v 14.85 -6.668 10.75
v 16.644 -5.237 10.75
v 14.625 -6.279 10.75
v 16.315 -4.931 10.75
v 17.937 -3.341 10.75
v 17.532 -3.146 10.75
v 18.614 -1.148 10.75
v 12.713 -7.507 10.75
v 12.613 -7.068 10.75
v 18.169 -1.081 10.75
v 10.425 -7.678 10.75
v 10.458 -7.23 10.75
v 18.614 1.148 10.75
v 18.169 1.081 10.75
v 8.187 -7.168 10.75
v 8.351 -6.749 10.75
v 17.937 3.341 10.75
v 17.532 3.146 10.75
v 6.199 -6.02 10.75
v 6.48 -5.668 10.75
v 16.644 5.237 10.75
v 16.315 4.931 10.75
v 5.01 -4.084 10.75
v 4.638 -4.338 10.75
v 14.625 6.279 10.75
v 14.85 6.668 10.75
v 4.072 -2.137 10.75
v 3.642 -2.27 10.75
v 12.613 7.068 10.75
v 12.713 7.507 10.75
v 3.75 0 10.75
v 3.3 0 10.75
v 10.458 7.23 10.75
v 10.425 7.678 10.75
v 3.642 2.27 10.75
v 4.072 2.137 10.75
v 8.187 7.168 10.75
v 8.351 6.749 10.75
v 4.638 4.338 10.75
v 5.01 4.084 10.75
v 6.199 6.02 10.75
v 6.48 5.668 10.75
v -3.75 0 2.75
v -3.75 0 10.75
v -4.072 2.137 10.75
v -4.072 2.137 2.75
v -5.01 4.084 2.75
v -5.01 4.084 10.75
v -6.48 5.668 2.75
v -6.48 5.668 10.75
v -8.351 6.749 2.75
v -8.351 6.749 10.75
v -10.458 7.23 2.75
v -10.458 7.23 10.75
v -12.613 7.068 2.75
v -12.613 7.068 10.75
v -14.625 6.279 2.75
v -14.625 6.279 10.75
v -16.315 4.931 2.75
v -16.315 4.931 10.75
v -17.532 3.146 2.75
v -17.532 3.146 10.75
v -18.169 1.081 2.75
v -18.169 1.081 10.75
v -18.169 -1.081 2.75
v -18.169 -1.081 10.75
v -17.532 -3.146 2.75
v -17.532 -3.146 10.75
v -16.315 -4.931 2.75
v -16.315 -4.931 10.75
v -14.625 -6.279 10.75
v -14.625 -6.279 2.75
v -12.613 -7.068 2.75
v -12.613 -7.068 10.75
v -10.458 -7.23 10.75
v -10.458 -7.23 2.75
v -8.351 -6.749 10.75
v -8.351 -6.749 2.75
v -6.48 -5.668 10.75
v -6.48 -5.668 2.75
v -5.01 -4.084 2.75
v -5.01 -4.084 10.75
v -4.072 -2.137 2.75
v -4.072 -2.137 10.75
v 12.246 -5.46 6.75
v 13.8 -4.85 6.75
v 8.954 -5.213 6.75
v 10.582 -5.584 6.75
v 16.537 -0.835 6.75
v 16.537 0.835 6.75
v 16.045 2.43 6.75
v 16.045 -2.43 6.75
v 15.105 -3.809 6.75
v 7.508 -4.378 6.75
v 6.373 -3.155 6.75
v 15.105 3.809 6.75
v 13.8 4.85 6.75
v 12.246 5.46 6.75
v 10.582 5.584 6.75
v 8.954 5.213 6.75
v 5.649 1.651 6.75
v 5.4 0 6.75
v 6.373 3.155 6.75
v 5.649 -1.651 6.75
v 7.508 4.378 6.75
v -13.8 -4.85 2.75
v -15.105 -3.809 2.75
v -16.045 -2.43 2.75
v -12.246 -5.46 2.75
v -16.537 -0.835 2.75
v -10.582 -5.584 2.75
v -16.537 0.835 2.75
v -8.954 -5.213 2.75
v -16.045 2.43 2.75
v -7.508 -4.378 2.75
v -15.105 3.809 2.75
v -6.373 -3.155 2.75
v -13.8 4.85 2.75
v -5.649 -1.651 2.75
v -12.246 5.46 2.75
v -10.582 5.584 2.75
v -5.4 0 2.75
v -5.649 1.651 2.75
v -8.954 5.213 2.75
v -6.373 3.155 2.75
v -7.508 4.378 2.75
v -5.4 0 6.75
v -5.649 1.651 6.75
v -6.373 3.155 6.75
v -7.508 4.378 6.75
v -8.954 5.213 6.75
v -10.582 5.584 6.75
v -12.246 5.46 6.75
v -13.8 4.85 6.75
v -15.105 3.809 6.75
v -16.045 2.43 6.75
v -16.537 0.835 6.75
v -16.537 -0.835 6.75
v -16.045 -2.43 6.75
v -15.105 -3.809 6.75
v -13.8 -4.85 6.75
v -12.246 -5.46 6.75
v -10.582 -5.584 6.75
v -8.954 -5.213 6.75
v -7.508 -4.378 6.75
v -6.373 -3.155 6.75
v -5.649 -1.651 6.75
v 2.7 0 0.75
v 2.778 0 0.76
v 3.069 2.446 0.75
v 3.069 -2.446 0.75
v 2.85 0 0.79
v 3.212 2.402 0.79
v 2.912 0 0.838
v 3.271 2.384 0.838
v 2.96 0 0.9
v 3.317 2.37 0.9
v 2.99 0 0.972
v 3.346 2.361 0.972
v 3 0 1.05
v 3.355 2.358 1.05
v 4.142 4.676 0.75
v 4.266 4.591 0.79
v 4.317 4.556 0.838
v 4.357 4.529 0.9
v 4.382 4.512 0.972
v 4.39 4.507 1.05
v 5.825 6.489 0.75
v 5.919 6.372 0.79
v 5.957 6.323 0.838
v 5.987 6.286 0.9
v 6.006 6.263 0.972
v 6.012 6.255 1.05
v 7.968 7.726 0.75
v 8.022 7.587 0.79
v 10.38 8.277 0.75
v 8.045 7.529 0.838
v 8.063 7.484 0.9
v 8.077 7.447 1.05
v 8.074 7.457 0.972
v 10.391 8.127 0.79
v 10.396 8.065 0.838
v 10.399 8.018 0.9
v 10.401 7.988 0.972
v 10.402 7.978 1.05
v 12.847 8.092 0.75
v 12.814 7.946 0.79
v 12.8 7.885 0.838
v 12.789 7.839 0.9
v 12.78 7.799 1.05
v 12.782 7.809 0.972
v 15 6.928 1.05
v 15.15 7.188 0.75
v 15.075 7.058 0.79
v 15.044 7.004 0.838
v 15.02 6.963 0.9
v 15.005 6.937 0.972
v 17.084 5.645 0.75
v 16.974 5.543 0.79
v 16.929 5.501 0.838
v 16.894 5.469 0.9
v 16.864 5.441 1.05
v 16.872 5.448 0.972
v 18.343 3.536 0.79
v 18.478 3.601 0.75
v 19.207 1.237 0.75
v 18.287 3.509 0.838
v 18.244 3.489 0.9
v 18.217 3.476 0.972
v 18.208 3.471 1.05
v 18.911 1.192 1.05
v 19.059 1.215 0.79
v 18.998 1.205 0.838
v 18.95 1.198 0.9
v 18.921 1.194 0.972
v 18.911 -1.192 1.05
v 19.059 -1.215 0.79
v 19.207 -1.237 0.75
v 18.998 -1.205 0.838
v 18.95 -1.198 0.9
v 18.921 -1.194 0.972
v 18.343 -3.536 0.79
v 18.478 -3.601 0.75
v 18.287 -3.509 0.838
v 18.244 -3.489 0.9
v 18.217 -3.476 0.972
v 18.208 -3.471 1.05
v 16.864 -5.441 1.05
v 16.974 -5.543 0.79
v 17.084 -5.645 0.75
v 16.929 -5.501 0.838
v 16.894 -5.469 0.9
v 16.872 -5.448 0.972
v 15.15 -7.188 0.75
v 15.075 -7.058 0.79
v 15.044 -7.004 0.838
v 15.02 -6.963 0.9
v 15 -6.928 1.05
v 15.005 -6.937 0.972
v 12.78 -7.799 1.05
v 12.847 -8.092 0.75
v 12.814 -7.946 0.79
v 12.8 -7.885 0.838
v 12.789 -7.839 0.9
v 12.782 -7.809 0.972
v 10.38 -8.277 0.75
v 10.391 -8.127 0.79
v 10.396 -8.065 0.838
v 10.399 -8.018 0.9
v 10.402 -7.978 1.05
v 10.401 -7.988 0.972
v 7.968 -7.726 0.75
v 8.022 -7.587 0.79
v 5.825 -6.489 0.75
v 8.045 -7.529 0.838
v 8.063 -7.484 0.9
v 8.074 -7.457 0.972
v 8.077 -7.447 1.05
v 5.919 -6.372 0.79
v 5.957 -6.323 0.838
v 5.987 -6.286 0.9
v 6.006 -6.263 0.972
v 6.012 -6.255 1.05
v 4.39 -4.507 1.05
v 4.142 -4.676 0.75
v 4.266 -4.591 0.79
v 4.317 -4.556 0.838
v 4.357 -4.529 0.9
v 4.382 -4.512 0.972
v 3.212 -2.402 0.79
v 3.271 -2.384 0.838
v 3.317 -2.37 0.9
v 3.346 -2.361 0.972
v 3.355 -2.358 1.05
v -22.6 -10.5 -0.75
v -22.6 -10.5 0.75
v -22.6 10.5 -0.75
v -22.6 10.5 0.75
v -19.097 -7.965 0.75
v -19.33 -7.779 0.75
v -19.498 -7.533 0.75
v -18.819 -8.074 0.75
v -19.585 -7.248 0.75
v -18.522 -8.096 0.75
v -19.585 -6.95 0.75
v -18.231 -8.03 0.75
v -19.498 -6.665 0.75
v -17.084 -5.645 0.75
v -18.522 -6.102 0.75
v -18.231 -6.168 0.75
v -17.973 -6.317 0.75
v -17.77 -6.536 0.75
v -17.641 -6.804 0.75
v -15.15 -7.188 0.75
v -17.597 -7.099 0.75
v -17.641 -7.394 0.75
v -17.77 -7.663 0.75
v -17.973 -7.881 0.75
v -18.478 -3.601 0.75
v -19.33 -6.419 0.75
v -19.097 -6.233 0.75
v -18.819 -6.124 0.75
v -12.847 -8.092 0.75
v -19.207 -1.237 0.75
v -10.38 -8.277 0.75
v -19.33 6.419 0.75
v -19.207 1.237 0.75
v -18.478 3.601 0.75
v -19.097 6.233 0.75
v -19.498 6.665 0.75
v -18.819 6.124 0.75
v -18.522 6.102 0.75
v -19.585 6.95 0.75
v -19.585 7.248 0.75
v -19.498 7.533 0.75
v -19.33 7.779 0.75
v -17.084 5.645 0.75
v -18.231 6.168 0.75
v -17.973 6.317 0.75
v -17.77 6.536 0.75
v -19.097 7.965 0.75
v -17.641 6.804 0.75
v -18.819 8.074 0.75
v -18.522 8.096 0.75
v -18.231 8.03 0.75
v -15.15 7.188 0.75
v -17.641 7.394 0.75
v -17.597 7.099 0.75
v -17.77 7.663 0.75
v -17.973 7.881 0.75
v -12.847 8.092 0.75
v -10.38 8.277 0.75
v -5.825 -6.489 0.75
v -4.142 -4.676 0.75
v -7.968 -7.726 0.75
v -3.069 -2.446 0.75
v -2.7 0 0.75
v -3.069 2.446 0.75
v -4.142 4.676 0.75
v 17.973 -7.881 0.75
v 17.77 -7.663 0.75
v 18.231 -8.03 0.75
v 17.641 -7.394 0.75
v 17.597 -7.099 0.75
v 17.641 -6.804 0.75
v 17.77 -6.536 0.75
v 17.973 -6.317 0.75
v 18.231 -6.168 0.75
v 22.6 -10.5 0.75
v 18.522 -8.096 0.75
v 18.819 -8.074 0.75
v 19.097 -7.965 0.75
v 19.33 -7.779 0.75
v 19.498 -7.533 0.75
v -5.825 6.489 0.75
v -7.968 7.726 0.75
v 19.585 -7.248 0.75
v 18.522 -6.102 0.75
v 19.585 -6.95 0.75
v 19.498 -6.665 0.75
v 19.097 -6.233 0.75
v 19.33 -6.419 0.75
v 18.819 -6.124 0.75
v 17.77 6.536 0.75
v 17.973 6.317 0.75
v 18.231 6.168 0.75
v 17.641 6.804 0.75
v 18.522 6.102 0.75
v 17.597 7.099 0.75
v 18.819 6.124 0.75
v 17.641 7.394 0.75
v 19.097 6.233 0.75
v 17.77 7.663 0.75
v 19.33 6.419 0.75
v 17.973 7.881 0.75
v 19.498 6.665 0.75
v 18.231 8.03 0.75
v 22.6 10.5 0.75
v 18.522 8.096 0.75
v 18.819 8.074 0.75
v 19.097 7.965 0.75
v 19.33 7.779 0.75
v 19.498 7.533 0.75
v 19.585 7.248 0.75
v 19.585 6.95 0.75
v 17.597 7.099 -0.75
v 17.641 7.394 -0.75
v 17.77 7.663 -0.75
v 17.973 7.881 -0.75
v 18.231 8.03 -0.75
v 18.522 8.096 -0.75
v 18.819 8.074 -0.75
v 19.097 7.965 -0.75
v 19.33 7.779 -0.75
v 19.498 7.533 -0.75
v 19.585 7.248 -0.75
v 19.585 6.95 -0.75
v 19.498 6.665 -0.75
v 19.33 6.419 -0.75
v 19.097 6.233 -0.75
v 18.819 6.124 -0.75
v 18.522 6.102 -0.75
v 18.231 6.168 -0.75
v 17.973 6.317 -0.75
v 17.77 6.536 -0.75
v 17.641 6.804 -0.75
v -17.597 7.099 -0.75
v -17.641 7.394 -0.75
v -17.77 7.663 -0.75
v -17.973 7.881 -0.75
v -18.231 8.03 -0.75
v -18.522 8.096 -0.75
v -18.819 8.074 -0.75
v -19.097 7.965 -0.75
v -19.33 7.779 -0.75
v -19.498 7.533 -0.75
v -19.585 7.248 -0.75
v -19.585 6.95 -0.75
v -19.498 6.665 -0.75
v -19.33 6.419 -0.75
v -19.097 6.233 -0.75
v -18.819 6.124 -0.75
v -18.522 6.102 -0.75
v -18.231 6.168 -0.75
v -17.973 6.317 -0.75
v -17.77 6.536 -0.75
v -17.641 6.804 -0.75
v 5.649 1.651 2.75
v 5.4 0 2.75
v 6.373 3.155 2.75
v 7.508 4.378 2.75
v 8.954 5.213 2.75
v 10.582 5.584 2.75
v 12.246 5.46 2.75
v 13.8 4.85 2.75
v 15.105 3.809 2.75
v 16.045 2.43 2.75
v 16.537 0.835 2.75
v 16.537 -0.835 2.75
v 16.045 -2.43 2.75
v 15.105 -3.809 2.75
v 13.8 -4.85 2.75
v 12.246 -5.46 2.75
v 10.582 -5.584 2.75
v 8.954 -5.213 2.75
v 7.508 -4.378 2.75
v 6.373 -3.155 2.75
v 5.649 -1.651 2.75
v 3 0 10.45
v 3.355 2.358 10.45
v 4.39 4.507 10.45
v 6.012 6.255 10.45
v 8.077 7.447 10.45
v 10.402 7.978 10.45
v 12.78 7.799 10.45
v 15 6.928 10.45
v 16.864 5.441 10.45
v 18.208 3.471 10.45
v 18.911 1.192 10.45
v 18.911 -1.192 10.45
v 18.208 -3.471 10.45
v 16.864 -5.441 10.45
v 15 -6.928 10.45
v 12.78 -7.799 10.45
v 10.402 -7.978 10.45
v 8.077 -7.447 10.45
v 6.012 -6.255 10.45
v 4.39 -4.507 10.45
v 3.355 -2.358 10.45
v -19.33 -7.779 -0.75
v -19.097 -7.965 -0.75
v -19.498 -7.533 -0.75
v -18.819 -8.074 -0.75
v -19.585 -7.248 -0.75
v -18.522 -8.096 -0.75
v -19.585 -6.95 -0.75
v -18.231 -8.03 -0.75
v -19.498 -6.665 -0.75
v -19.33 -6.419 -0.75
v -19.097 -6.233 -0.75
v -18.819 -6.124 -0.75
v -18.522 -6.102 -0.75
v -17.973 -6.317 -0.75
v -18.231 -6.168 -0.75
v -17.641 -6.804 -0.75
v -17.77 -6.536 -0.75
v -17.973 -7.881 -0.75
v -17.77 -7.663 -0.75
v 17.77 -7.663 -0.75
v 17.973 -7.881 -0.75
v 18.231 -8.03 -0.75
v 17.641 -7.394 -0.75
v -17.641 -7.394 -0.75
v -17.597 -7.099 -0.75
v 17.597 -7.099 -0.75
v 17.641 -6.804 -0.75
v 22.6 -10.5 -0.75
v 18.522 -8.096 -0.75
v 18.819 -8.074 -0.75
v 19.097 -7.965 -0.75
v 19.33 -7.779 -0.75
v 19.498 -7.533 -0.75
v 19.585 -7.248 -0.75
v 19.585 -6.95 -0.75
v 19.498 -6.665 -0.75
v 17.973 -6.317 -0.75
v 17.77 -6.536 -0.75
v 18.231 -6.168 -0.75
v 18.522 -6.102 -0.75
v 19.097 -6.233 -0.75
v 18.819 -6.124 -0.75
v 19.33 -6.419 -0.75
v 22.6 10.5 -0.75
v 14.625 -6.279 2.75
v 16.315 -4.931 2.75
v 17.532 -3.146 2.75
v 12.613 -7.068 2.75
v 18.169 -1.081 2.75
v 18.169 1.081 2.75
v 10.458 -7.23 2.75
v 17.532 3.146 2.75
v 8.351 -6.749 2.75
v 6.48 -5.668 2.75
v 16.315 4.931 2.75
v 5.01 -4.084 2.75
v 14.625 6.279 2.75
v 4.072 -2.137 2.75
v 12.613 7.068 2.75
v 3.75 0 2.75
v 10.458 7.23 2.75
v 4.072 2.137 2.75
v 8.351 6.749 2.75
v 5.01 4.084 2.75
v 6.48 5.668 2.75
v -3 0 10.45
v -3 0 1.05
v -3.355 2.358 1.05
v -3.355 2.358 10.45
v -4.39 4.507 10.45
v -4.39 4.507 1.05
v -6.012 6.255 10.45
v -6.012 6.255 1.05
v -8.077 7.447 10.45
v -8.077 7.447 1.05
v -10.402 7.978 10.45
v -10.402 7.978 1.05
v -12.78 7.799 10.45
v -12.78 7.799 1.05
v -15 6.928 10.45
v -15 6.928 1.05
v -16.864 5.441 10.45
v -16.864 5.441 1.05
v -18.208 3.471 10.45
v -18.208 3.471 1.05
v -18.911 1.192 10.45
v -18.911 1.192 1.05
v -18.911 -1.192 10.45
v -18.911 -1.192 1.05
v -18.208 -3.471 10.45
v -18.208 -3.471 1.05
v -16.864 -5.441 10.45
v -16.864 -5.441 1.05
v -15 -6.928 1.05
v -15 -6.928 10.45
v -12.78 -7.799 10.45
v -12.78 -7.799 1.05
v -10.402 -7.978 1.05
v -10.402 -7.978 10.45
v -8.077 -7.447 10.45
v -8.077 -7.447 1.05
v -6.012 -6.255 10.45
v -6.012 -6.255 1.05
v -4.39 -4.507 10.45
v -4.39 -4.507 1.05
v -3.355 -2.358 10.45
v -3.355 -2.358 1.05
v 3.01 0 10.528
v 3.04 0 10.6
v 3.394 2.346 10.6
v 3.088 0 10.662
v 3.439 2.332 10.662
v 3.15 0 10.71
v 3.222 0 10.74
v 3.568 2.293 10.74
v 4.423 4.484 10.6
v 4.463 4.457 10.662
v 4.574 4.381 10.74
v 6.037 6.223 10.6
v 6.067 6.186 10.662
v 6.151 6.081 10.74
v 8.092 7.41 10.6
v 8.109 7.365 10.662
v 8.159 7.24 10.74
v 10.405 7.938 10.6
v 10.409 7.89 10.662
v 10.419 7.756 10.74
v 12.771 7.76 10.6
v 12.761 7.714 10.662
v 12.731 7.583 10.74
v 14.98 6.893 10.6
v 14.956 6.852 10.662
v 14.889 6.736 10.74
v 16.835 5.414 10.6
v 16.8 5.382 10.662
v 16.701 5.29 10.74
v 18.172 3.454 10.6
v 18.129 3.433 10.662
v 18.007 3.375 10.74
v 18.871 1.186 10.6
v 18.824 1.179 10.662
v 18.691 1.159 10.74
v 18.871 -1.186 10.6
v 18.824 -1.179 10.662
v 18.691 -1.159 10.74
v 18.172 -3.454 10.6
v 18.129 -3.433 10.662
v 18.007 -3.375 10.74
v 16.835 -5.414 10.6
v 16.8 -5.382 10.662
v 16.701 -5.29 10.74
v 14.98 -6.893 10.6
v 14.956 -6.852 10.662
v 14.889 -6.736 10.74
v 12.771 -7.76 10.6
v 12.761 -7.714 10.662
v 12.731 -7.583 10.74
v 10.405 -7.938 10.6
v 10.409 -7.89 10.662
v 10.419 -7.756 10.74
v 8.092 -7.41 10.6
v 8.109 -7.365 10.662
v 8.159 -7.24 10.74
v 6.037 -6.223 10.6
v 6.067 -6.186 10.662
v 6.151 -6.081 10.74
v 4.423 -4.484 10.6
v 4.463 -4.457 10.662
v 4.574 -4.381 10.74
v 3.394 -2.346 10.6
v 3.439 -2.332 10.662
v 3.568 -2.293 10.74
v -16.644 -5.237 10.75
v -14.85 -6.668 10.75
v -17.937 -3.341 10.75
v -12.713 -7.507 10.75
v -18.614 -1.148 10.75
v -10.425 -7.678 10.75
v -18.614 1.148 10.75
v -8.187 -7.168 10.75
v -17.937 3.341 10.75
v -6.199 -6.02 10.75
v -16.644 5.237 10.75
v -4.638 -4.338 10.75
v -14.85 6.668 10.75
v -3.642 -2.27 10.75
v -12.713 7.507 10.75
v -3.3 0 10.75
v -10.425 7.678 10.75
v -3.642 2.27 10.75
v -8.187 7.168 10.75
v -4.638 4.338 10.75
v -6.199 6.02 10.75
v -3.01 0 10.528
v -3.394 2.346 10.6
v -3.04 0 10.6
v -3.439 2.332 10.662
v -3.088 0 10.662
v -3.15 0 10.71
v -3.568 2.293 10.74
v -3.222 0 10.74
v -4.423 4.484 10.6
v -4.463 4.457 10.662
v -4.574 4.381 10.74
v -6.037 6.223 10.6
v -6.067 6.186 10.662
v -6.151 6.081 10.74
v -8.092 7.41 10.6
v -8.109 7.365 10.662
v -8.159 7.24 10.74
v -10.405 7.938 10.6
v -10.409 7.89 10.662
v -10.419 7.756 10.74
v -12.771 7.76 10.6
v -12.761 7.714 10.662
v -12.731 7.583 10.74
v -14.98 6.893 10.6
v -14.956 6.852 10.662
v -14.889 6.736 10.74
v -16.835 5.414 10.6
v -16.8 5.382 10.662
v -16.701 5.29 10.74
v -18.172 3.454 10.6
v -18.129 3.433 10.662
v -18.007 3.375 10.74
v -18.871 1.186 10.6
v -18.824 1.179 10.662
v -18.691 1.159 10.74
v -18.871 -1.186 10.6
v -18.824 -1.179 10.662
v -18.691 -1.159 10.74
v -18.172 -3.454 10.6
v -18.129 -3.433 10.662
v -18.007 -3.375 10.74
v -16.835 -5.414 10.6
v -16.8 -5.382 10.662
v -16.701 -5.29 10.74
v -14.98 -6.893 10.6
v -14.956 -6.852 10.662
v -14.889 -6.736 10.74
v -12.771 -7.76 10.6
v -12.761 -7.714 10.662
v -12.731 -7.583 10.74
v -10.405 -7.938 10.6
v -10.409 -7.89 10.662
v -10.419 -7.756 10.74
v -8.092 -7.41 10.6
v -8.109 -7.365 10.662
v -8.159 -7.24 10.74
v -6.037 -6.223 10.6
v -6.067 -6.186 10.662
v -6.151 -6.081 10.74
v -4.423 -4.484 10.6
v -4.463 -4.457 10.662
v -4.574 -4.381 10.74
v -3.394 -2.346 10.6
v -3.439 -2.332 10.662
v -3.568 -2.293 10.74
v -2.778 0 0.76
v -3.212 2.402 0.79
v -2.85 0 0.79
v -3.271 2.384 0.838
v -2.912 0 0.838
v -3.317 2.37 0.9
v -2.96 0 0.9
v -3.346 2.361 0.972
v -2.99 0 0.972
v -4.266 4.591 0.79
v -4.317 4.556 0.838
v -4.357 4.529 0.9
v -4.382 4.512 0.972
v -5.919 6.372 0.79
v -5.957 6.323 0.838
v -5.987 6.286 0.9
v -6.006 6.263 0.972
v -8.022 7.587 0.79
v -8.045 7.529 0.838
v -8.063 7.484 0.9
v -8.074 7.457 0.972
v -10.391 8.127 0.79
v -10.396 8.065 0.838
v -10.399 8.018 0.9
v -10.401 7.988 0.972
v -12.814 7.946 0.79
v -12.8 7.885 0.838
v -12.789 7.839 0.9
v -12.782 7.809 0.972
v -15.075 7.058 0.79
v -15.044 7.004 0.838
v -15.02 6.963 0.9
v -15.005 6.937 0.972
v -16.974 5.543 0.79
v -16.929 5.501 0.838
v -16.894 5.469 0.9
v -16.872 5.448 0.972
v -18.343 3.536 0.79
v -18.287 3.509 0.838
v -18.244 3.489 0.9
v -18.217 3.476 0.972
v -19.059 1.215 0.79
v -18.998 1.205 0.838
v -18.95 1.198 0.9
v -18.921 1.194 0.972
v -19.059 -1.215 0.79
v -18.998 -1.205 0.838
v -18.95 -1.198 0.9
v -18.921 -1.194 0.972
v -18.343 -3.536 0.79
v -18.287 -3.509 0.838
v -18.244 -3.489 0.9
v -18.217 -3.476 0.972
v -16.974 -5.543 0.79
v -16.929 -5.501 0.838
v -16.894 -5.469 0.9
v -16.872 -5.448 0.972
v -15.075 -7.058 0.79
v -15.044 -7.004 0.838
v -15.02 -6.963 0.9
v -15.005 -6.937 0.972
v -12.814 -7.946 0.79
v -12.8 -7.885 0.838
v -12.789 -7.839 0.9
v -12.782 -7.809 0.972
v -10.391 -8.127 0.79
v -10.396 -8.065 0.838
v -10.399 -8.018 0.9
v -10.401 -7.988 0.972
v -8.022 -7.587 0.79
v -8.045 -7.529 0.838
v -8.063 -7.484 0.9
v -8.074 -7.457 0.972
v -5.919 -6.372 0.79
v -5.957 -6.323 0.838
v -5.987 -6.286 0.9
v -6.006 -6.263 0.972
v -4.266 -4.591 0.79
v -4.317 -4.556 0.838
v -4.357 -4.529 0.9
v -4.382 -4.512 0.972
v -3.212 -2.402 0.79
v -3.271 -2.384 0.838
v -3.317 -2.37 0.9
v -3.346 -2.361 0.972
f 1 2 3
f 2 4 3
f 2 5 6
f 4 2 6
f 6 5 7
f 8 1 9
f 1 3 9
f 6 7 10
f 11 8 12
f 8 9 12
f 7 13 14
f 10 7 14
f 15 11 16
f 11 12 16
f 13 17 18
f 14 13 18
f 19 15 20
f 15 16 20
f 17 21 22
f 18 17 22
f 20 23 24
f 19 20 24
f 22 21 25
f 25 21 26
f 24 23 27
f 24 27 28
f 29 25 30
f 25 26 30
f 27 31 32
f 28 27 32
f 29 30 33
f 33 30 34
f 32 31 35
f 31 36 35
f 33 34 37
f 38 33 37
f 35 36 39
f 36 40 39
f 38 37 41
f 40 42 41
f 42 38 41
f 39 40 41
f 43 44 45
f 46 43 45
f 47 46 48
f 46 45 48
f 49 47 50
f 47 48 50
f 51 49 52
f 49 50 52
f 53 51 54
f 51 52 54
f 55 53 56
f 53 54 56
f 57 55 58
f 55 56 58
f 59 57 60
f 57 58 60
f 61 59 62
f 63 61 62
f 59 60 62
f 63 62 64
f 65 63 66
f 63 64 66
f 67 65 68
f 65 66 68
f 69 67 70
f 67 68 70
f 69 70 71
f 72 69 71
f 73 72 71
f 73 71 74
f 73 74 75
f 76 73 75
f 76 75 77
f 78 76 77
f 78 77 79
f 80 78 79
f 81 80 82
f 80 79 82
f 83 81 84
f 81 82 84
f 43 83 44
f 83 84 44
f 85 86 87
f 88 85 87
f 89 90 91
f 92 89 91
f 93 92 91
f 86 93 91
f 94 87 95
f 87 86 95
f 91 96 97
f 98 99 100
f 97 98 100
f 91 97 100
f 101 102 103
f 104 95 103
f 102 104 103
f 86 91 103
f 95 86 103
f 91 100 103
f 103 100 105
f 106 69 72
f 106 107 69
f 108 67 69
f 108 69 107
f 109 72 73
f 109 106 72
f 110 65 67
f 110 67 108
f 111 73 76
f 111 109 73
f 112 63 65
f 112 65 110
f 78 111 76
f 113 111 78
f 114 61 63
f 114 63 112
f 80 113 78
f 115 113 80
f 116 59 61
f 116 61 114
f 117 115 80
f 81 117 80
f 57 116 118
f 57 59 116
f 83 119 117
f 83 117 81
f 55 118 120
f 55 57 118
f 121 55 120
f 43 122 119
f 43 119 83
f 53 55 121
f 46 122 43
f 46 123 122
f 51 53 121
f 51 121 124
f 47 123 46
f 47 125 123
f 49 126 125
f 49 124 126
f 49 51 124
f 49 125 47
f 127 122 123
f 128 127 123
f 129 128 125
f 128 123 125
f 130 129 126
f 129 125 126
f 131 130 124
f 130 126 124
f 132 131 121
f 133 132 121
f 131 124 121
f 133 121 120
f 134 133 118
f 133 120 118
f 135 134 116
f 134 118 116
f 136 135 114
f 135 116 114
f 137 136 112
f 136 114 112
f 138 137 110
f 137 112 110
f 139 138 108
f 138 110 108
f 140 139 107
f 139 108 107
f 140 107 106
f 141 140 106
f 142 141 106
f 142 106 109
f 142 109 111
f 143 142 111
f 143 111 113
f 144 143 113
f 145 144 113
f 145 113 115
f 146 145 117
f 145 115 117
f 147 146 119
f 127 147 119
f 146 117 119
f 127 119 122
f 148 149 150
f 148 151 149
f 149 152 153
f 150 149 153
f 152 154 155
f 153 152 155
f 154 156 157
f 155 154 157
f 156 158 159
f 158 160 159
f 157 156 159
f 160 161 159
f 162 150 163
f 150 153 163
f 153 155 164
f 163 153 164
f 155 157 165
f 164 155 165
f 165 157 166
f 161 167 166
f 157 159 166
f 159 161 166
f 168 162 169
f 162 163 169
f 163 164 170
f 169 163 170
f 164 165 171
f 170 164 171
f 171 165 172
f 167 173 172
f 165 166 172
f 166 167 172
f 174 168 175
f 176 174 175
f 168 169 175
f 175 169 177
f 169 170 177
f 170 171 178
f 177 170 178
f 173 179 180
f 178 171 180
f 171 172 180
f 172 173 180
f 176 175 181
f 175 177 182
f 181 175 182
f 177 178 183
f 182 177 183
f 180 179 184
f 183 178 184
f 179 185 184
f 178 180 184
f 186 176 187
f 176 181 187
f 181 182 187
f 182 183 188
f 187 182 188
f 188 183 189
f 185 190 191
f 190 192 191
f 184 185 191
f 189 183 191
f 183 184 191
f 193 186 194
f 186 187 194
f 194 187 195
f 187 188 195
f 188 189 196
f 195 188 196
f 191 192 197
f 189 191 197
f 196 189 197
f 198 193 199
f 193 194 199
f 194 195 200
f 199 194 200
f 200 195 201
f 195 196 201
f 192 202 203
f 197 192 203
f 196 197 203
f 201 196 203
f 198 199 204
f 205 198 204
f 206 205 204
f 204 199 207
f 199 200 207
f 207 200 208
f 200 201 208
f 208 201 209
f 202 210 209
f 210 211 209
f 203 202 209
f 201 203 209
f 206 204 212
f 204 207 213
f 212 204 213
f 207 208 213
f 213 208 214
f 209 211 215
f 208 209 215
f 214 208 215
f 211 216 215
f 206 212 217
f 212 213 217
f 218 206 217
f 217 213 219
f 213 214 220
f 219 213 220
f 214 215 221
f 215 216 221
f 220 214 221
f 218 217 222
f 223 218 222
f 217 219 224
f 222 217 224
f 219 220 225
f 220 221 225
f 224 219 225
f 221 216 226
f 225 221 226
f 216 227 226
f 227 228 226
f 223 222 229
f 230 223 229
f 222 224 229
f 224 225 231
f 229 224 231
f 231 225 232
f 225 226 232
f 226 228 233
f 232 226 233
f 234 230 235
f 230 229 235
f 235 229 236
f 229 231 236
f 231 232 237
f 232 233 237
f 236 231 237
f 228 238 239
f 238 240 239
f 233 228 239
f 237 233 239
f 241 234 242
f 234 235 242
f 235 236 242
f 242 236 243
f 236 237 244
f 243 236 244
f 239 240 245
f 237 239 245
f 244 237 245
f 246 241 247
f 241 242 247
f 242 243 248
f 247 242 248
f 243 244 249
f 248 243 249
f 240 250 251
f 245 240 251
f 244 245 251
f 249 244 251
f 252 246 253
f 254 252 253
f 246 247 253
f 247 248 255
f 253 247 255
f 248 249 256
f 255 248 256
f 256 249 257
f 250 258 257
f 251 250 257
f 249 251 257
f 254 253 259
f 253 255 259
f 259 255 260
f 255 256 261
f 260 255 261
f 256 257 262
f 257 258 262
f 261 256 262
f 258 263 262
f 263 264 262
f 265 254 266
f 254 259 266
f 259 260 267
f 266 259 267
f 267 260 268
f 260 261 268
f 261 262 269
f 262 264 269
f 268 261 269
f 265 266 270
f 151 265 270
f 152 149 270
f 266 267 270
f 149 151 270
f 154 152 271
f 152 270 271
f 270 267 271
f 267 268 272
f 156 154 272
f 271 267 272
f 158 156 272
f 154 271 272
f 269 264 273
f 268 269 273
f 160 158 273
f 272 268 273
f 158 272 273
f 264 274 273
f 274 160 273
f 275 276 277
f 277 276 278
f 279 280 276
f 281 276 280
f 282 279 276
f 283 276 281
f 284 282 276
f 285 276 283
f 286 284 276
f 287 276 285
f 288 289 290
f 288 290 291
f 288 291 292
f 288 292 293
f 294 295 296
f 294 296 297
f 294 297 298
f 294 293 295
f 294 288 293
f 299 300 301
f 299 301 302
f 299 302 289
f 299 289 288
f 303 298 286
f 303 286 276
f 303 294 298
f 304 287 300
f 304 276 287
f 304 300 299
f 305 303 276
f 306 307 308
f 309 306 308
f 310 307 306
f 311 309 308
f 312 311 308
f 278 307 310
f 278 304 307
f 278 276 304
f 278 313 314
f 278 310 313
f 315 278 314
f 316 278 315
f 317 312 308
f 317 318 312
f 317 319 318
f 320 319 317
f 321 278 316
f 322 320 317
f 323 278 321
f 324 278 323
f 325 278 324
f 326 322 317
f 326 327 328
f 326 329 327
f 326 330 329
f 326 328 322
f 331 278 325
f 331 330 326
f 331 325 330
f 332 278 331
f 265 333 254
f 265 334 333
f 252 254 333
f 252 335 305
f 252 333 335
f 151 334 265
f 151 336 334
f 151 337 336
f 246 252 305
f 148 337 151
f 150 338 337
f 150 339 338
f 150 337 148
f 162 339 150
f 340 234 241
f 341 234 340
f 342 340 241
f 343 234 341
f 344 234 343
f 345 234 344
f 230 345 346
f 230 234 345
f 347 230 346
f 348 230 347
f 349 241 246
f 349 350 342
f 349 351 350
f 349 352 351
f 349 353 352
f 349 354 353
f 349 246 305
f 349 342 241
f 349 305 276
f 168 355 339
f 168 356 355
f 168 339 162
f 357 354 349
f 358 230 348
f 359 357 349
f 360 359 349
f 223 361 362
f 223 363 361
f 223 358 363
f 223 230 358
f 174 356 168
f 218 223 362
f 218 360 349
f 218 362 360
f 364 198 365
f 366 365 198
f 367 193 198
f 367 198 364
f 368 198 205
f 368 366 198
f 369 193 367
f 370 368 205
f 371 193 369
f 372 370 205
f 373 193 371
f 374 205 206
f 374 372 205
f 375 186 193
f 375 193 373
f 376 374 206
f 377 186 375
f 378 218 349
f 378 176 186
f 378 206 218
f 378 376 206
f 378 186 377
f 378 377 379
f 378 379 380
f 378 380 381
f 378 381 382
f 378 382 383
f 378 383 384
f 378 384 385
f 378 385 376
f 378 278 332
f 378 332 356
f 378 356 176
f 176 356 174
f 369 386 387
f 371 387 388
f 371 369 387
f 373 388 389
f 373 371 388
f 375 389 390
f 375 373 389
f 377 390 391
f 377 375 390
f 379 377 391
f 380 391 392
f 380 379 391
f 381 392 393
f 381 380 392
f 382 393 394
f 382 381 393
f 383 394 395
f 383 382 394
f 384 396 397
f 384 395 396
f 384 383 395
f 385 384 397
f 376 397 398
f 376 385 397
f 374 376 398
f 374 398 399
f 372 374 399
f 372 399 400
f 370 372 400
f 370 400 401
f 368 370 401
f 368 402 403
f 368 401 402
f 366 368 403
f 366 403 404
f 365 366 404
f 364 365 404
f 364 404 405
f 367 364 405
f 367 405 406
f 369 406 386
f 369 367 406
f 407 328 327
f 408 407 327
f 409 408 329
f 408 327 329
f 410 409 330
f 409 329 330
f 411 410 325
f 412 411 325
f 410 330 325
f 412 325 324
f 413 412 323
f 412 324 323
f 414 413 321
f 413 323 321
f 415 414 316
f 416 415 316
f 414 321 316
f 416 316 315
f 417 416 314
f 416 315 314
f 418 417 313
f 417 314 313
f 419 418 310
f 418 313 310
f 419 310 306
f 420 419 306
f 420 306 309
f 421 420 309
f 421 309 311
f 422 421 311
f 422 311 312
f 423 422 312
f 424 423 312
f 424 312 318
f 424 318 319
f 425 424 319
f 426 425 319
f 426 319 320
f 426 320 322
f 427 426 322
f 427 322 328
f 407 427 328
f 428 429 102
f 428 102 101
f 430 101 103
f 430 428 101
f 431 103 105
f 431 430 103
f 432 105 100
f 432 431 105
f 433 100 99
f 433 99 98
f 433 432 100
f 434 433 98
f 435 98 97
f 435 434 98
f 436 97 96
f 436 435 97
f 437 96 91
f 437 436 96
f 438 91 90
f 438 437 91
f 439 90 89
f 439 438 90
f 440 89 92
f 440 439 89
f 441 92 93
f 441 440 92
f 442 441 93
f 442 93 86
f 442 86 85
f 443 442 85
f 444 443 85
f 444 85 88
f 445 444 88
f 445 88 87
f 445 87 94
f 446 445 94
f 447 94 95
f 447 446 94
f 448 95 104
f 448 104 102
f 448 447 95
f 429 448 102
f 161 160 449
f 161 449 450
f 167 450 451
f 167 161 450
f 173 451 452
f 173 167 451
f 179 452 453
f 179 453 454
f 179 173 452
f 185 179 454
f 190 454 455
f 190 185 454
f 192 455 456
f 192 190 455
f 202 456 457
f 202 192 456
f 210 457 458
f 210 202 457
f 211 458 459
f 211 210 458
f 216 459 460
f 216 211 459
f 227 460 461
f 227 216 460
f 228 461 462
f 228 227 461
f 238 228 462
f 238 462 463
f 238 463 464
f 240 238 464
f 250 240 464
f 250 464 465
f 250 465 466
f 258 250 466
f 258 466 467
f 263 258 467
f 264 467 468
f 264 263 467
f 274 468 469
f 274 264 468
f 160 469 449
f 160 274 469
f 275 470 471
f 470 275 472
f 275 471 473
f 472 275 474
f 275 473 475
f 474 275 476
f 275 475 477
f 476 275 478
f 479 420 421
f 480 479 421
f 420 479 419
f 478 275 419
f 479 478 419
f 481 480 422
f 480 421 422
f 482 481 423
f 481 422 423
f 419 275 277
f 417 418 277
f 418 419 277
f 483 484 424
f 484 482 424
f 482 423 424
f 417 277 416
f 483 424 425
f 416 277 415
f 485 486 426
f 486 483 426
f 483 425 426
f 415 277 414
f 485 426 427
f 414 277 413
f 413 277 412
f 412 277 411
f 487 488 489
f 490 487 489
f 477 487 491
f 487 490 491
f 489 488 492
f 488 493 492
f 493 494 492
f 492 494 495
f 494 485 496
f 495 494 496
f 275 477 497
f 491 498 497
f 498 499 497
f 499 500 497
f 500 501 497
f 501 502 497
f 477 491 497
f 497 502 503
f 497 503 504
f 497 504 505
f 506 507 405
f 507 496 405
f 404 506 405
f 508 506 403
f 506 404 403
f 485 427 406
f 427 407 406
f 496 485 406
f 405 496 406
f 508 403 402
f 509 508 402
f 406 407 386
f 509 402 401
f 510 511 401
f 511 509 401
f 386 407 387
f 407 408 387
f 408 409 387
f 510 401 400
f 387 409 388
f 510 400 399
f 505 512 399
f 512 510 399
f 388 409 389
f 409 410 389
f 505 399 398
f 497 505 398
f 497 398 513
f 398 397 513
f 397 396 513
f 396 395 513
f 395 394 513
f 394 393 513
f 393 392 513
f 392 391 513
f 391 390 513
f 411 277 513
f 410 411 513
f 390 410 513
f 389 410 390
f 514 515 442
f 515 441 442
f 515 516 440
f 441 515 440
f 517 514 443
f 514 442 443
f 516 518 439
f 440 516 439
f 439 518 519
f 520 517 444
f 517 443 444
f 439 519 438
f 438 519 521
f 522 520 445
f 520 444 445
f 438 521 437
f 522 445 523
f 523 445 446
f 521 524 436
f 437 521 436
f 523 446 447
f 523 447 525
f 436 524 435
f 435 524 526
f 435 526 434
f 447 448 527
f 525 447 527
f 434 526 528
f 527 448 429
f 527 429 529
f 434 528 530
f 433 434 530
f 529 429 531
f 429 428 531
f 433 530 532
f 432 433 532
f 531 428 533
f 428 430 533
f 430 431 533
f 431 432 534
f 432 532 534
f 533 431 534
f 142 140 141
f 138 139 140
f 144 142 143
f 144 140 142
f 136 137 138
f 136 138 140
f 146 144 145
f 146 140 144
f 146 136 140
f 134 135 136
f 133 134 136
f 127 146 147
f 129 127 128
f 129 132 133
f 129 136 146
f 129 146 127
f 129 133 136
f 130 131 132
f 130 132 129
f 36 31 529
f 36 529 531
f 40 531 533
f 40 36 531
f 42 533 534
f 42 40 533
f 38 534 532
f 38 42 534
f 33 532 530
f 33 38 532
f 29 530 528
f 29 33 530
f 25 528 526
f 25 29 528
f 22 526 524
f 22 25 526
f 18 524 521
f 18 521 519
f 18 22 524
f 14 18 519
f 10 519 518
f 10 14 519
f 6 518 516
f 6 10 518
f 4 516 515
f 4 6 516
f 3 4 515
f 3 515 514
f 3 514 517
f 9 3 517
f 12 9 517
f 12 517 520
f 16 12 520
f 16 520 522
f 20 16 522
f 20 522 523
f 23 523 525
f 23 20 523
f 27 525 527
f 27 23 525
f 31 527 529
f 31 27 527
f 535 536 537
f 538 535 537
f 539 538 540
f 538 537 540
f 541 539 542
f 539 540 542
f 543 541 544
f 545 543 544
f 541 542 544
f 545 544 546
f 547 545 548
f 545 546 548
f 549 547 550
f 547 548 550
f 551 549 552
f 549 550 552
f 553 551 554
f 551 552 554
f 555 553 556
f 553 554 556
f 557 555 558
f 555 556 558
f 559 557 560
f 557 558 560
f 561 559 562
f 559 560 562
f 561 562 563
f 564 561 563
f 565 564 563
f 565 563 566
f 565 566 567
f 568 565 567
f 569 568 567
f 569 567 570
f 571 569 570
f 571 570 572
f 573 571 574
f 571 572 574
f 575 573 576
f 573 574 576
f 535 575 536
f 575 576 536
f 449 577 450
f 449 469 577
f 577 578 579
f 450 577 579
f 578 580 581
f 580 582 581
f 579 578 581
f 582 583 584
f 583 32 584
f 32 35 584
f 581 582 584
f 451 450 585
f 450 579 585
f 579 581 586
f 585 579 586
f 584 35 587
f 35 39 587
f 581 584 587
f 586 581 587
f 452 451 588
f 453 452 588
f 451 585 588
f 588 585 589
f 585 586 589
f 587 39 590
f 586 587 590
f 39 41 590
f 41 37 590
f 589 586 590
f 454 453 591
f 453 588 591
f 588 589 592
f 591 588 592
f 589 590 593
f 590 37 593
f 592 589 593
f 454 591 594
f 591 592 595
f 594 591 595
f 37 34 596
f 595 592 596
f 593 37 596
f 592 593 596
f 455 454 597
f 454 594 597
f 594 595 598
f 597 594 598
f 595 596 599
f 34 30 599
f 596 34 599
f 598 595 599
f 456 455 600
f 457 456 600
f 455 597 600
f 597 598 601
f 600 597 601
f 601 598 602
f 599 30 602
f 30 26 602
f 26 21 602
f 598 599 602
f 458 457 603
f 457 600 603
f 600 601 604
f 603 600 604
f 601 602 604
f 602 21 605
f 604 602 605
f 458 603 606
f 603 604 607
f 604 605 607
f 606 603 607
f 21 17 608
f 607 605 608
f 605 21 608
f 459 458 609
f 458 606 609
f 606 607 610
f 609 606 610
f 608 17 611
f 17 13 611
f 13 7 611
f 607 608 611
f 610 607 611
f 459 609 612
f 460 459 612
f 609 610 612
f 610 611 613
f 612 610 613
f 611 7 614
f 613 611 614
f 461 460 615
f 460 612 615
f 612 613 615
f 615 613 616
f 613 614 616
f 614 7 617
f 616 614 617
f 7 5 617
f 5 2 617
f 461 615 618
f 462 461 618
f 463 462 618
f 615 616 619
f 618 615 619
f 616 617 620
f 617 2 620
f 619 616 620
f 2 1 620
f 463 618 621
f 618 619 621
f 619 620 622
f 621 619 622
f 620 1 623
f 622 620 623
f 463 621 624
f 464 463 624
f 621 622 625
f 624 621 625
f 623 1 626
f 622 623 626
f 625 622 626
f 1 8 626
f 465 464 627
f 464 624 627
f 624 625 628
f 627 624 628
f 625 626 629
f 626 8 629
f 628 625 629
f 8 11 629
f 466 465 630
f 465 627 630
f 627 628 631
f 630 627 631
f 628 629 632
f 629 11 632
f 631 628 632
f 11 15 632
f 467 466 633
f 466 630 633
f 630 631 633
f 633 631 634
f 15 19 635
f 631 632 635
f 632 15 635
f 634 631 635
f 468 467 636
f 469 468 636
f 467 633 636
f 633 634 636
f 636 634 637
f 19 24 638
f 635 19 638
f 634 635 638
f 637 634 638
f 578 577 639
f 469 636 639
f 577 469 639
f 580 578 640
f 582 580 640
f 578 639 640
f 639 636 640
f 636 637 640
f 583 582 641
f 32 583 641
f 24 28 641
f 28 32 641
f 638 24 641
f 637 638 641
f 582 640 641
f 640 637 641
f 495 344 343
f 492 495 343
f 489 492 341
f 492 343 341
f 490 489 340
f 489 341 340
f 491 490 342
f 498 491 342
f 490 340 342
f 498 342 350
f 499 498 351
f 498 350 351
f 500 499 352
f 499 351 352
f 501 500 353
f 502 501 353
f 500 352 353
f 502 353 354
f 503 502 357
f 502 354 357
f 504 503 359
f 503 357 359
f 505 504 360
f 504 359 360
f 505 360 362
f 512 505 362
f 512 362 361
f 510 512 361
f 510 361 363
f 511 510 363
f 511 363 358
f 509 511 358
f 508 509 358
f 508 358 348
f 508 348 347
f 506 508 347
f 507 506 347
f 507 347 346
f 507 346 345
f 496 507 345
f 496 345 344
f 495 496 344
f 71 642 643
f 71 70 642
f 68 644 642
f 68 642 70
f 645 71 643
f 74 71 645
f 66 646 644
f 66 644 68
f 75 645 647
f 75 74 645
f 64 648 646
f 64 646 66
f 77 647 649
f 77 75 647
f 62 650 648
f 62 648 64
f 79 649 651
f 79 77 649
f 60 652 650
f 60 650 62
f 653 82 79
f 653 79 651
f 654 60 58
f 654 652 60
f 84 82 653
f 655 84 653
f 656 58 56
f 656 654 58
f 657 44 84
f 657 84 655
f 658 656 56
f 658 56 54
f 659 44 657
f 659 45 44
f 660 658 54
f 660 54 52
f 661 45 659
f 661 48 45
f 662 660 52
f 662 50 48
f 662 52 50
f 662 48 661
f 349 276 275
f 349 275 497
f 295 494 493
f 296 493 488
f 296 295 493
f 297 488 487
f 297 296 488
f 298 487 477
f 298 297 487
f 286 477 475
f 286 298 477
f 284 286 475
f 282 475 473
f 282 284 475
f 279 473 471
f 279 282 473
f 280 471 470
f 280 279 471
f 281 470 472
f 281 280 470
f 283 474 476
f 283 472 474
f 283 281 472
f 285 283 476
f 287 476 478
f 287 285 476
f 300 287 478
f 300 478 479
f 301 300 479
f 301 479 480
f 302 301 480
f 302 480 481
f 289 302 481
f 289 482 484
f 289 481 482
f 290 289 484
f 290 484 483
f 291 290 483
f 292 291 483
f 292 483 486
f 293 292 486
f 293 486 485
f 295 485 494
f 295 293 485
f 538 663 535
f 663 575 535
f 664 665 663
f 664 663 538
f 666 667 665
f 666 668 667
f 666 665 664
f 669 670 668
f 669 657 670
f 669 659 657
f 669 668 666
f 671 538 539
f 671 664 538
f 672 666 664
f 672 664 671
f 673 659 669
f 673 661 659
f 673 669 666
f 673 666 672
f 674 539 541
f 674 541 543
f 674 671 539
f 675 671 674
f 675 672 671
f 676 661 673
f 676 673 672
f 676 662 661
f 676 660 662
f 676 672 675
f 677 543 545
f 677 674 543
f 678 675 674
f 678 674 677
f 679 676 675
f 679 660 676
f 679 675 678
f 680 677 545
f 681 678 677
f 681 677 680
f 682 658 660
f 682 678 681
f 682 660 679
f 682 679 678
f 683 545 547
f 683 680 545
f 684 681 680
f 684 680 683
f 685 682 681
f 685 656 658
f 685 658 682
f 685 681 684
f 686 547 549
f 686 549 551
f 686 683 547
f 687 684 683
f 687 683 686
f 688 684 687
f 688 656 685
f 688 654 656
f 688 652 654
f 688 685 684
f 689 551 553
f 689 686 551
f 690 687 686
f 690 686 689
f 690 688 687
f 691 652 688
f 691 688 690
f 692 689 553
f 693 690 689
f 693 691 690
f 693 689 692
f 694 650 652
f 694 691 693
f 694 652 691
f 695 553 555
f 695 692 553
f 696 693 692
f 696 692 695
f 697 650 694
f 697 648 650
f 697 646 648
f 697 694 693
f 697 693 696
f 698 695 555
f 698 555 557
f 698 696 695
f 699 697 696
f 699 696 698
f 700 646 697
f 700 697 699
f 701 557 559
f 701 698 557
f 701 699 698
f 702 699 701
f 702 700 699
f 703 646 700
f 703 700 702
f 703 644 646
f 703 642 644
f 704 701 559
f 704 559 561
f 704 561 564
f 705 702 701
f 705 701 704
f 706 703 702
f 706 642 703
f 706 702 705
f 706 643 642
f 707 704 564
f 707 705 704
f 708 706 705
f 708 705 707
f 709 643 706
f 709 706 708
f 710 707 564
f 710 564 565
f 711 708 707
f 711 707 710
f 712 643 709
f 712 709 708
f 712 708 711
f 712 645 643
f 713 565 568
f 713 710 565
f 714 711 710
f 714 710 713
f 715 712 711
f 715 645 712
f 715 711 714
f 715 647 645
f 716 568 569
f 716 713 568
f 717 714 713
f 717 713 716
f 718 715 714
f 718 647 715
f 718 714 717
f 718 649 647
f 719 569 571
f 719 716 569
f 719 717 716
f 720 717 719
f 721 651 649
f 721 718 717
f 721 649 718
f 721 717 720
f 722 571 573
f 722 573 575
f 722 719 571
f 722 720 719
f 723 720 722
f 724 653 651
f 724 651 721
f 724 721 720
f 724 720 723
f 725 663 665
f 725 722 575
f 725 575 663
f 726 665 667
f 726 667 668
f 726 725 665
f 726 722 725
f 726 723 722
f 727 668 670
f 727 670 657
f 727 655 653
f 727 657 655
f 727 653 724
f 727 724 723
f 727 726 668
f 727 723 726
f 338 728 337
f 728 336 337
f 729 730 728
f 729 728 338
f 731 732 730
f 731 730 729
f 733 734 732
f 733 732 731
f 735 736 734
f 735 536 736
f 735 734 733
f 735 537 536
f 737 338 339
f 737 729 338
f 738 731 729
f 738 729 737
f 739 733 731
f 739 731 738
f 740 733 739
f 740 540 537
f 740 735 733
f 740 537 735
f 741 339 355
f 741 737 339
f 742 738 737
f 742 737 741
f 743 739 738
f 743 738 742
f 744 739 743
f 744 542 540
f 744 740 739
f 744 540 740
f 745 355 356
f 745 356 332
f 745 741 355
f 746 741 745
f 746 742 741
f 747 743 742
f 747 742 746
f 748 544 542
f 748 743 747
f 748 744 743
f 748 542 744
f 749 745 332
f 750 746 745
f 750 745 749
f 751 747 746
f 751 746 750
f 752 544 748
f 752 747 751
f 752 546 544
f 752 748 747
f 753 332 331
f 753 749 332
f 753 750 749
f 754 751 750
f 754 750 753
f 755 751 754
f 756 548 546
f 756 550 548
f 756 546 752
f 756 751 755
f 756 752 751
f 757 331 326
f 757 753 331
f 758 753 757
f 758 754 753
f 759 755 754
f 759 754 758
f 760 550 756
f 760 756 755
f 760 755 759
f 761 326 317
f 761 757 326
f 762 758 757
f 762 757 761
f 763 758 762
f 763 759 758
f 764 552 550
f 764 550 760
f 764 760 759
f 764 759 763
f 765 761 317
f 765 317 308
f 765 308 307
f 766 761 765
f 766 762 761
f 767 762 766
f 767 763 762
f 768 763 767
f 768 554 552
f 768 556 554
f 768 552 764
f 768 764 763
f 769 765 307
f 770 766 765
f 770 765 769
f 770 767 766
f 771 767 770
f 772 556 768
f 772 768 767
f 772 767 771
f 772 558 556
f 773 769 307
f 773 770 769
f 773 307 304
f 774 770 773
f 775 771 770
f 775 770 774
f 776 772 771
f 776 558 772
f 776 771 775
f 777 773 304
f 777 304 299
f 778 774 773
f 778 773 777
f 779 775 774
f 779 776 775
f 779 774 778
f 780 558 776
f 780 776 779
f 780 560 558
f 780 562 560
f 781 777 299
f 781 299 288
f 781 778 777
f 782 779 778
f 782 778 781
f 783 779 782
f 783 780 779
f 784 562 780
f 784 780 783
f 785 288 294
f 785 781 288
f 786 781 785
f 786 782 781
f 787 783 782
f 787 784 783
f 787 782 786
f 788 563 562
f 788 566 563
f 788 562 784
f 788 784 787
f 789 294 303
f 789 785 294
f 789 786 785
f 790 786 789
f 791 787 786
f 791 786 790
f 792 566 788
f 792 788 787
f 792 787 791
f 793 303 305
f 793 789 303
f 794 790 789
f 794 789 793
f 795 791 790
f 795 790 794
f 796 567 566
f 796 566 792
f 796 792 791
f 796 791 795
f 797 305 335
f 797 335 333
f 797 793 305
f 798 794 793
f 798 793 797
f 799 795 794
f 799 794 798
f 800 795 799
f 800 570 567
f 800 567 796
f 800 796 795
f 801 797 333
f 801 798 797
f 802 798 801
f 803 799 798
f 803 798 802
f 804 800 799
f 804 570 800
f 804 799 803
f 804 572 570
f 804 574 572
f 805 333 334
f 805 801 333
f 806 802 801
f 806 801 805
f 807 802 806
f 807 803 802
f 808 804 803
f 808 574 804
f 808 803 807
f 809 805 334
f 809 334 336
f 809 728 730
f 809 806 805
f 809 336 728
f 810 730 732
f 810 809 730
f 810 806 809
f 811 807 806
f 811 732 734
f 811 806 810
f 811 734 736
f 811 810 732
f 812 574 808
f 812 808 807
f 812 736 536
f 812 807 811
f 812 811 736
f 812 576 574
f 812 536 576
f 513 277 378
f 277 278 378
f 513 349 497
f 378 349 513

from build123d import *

# Parameters (mm, degrees)
SKETCH1_W               = 45.2
SKETCH1_H               = 21
BOSS_EXTRUDE1_DEPTH     = 0.75
SKETCH2_R               = 1
CUT_EXTRUDE1_DEPTH      = 2.5
MIRROR2_COPY_1_SKETCH_R = 1
MIRROR2_COPY_1_DEPTH    = 2.5
SKETCH3_R               = 8
BOSS_EXTRUDE2_DEPTH     = 10
SKETCH9_R               = 7.25
CUT_EXTRUDE2_DEPTH      = 8
FILLET1_R               = 0.3
SKETCH10_R              = 5.6
BOSS_EXTRUDE3_DEPTH     = 4


with BuildPart() as part:
    # Sketch1 → Boss-Extrude1 (new body, symmetric)
    with BuildSketch(Plane.XY):
        Rectangle(SKETCH1_W, SKETCH1_H)
    extrude(amount=BOSS_EXTRUDE1_DEPTH, both=True)

    # Sketch2 → Cut-Extrude1 (cut, through all)
    with BuildSketch(Plane.XY.offset(0.75)):
        with Locations((-18.596547757, 7.099196252)):
            Circle(SKETCH2_R)
    cut_extrude1 = extrude(amount=-CUT_EXTRUDE1_DEPTH, mode=Mode.SUBTRACT)

    # Mirror1: Cut-Extrude1 across plane
    add(cut_extrude1.mirror(Plane(origin=(0, 0, 0), x_dir=(0, 0, 1), z_dir=(1, 0, 0))), mode=Mode.SUBTRACT)

    # Mirror2: Cut-Extrude1 across plane
    add(cut_extrude1.mirror(Plane.ZX), mode=Mode.SUBTRACT)

    # Mirror2 copy 1 sketch → Mirror2 copy 1 (cut, through all)
    with BuildSketch(Plane(origin=(0, 0, 0.75), x_dir=(-1, 0, 0), z_dir=(0, 0, 1))):
        with Locations((-18.596547757, 7.099196252)):
            Circle(MIRROR2_COPY_1_SKETCH_R)
    extrude(amount=-MIRROR2_COPY_1_DEPTH, mode=Mode.SUBTRACT)

    # Sketch3 → Boss-Extrude2 (add)
    with BuildSketch(Plane.XY.offset(0.75)):
        with Locations((-11, 0)):
            Circle(SKETCH3_R)
    boss_extrude2 = extrude(amount=BOSS_EXTRUDE2_DEPTH)

    # Sketch9 → Cut-Extrude2 (cut)
    with BuildSketch(Plane.XY.offset(10.75)):
        with Locations((-11, 0)):
            Circle(SKETCH9_R)
    cut_extrude2 = extrude(amount=-CUT_EXTRUDE2_DEPTH, mode=Mode.SUBTRACT)

    # Mirror3: Boss-Extrude2 across plane
    add(boss_extrude2.mirror(Plane(origin=(0, 0, 0), x_dir=(0, 0, 1), z_dir=(1, 0, 0))))

    # Mirror4: Cut-Extrude2 across plane
    add(cut_extrude2.mirror(Plane(origin=(0, 0, 0), x_dir=(0, 0, 1), z_dir=(1, 0, 0))), mode=Mode.SUBTRACT)

    # Fillet1
    fillet1_edges = [part.edges().sort_by_distance(p)[0] for p in [
        (-19, 0, 0.75),
        (-19, 0, 10.75),
        (19, 0, 0.75),
        (19, 0, 10.75),
    ]]
    fillet(fillet1_edges, radius=FILLET1_R)

    # Sketch10 → Boss-Extrude3 (add)
    with BuildSketch(Plane.XY.offset(2.75)):
        with Locations((-11, 0)):
            Circle(SKETCH10_R)
    boss_extrude3 = extrude(amount=BOSS_EXTRUDE3_DEPTH)

    # Mirror5: Boss-Extrude3 across plane
    add(boss_extrude3.mirror(Plane(origin=(0, 0, 0), x_dir=(0, 0, 1), z_dir=(1, 0, 0))))


solid = part.part
